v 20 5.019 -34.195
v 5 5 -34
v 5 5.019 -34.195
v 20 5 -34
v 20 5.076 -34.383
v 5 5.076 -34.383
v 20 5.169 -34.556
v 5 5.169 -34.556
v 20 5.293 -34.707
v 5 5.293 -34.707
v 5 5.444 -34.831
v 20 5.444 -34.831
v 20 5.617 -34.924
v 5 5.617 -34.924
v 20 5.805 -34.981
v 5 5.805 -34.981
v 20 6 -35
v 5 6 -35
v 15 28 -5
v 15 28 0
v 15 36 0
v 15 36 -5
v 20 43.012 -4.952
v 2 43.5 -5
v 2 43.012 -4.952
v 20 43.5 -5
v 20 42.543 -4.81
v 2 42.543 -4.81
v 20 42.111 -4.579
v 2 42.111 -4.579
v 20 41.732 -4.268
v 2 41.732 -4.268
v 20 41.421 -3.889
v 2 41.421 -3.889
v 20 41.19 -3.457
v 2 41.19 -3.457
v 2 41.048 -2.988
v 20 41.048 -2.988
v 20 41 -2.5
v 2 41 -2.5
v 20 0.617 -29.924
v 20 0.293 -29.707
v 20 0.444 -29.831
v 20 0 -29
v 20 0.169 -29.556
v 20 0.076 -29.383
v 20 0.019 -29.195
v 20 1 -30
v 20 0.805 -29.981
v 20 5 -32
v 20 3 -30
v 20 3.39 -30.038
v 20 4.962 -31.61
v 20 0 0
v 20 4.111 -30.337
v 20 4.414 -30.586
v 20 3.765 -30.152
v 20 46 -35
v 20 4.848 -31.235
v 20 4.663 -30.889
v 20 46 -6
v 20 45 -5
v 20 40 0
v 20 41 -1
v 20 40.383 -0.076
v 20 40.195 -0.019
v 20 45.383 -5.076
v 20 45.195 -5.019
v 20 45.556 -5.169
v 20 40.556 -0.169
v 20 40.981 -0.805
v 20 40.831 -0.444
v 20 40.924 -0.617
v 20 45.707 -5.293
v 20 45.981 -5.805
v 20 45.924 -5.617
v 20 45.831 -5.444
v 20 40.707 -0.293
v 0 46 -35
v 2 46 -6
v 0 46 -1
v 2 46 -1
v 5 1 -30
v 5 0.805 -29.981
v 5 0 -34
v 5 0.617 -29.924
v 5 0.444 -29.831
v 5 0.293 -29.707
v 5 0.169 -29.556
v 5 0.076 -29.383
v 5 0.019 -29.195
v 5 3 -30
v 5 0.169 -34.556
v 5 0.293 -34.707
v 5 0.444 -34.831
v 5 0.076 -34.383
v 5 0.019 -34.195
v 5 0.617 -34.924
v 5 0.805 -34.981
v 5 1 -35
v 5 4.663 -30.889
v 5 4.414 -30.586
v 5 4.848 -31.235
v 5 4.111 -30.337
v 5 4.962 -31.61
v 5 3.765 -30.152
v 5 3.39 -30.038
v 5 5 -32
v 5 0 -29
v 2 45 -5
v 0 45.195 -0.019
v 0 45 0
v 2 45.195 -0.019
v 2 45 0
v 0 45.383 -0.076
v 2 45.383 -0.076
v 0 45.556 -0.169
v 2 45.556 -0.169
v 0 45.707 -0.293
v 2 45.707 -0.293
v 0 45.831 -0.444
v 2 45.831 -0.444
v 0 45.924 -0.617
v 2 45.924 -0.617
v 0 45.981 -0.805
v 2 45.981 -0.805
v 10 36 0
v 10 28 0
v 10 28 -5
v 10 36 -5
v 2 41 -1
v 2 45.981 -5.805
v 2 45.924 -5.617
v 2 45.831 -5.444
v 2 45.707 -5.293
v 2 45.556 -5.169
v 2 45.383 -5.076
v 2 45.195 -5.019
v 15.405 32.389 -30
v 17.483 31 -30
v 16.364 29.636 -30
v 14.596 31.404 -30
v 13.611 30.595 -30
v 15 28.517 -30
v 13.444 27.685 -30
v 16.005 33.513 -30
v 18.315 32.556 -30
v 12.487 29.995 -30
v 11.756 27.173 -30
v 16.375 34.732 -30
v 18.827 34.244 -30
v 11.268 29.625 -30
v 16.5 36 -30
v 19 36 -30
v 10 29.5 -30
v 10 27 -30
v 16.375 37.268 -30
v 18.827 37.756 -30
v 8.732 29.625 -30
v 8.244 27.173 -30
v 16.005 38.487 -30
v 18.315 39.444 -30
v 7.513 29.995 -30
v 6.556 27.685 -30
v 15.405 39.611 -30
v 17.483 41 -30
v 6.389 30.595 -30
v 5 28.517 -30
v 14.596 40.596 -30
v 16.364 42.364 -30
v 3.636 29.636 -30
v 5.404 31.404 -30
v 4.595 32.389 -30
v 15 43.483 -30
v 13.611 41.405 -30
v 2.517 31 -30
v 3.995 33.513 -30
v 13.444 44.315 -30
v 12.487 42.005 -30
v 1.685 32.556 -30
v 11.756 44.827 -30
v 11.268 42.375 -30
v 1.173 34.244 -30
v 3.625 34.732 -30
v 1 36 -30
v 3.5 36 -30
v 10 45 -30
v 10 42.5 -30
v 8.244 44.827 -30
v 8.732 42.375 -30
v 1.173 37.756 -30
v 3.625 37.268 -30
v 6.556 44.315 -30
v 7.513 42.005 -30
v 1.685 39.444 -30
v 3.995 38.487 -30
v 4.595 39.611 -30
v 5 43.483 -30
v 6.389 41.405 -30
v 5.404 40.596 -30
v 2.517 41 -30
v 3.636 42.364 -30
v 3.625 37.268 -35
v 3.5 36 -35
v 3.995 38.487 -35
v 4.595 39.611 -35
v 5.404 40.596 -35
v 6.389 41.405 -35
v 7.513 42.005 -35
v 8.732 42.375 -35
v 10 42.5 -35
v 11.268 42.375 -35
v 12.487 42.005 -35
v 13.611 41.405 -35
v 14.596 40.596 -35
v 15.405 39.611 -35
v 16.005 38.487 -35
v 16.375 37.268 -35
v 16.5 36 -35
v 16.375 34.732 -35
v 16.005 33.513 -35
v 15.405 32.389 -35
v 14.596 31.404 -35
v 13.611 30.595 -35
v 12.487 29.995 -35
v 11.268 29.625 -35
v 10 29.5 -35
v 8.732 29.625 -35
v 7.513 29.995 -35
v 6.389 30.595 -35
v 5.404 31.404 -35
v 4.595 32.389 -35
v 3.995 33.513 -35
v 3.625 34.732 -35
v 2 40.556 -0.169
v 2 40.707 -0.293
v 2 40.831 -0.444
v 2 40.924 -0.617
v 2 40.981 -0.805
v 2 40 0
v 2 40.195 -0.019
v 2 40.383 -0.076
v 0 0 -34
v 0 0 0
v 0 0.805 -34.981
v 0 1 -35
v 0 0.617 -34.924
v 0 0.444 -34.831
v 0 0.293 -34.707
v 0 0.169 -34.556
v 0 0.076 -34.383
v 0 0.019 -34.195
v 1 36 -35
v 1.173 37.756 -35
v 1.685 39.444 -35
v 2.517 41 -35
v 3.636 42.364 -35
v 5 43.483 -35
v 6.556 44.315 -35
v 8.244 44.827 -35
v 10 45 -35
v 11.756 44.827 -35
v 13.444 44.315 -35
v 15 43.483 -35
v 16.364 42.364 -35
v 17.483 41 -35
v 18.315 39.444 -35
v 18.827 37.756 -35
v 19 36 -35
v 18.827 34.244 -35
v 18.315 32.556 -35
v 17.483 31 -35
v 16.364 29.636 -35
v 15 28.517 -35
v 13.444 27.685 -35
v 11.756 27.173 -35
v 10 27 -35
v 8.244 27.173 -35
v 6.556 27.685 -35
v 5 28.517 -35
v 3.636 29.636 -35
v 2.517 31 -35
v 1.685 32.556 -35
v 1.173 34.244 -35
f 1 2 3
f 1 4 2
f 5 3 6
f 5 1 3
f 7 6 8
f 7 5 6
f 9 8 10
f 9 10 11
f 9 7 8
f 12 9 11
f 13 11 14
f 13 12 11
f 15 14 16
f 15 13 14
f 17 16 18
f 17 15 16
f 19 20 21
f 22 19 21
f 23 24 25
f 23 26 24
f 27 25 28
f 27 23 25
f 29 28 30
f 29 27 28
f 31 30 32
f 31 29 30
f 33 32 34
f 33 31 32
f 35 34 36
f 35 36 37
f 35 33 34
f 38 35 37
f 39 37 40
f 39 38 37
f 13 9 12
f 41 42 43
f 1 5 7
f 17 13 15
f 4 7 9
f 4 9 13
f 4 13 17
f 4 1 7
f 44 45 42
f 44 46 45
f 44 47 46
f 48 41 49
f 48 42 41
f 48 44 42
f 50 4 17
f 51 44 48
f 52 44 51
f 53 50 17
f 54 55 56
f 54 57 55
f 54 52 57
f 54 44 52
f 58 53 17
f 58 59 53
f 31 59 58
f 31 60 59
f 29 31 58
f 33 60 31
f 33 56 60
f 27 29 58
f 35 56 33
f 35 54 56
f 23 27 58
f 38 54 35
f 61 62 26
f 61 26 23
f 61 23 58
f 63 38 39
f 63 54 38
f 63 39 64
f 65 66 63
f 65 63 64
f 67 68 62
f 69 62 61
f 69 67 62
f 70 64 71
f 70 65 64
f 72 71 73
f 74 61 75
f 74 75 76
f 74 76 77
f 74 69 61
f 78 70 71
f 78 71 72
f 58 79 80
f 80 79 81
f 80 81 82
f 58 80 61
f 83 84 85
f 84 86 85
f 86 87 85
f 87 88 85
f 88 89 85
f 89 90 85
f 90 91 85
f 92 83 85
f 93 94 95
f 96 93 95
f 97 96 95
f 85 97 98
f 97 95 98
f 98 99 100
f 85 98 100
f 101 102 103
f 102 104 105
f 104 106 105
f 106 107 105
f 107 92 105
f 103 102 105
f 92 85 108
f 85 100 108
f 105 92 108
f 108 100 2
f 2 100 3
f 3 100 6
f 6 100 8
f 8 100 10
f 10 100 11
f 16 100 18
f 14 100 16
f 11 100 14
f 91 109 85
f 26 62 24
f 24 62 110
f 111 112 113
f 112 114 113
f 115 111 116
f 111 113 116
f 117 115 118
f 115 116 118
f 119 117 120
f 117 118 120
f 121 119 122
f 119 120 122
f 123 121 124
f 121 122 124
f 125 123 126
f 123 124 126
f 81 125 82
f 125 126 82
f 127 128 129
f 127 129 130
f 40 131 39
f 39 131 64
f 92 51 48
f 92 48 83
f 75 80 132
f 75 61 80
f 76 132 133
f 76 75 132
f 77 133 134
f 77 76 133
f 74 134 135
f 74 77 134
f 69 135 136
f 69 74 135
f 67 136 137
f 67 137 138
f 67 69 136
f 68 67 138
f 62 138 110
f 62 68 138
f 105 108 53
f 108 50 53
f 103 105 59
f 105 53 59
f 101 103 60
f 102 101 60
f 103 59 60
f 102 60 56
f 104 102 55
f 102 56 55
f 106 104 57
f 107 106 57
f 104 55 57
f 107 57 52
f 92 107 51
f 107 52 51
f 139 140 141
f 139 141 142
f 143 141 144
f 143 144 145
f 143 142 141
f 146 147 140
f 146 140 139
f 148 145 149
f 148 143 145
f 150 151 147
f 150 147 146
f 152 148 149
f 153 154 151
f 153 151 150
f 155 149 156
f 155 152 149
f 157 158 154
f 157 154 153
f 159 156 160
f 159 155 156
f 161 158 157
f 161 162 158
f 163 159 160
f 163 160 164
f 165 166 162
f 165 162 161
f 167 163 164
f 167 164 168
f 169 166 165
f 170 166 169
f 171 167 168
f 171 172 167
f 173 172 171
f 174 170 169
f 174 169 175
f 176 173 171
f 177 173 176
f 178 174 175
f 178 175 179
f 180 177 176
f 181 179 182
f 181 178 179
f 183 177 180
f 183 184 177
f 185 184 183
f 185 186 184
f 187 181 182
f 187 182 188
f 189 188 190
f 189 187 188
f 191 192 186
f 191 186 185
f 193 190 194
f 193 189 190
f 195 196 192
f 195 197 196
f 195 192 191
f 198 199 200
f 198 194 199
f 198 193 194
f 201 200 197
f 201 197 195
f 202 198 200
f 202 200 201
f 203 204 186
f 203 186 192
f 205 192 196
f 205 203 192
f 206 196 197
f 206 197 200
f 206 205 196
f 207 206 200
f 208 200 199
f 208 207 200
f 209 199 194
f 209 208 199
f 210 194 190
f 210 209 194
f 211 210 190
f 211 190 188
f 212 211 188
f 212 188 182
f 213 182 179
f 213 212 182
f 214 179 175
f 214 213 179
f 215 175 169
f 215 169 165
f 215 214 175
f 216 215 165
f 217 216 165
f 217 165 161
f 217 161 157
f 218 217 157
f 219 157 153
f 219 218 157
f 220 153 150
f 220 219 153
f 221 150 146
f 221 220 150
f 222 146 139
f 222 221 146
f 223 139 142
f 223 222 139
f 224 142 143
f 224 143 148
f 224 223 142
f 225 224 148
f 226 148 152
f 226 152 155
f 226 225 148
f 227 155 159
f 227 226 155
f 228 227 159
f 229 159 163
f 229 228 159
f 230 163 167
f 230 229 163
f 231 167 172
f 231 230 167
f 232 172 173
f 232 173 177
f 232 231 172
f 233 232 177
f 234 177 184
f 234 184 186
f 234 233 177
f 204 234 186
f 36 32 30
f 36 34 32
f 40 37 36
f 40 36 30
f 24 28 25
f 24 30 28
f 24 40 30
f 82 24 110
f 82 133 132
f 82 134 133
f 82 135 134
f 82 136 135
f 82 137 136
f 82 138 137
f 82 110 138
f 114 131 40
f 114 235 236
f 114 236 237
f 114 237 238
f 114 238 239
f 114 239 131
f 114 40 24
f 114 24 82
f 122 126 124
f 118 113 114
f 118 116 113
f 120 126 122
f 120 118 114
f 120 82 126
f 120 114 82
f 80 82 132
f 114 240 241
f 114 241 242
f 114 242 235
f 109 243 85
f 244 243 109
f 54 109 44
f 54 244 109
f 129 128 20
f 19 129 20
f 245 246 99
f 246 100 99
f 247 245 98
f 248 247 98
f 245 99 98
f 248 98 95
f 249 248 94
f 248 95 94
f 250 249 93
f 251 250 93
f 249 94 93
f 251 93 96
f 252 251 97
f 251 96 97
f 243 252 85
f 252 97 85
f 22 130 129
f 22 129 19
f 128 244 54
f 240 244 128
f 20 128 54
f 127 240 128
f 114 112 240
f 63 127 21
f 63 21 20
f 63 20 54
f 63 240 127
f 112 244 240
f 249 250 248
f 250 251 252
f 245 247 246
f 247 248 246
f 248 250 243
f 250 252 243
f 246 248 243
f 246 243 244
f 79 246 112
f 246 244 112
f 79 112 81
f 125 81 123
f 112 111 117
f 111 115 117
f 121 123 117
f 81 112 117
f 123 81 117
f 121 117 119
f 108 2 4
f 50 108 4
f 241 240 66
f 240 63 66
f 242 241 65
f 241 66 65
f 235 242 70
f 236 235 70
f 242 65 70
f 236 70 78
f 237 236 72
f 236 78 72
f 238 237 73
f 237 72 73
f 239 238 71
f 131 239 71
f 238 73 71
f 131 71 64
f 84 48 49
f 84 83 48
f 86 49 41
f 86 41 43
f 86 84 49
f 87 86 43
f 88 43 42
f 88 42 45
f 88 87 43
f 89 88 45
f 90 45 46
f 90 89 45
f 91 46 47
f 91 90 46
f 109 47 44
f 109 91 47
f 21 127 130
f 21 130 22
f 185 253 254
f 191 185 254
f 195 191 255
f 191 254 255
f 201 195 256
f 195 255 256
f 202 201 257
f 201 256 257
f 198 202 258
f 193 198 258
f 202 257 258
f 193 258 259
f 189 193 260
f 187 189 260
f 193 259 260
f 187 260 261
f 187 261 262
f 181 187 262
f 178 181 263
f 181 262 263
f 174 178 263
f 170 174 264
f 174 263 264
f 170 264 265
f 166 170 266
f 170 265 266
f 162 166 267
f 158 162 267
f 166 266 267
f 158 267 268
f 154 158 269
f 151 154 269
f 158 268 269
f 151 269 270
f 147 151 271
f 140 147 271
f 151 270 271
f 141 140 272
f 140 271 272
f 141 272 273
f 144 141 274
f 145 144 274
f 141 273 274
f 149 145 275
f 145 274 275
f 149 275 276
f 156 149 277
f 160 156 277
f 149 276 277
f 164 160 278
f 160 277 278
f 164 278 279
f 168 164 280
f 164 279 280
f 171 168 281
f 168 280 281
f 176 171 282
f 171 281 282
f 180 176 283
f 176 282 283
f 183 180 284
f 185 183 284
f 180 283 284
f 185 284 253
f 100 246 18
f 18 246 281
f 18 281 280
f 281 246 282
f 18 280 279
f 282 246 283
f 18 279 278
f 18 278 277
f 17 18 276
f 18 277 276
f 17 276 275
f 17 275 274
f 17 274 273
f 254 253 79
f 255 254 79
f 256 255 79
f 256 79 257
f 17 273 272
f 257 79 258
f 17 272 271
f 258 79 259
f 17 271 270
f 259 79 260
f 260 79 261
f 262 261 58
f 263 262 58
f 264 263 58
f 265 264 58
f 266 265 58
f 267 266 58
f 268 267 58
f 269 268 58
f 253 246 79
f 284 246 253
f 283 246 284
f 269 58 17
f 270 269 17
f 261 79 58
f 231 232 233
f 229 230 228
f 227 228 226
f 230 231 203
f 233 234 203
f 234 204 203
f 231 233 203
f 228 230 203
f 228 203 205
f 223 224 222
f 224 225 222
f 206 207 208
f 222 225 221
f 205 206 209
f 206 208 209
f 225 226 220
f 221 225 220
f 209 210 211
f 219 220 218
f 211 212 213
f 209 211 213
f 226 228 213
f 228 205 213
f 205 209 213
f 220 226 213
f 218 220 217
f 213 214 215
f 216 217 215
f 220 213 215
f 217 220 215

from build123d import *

# Parameters (mm, degrees)
SKETCH1_W           = 20
SKETCH1_H           = 46
BOSS_EXTRUDE1_DEPTH = 35
SKETCH2_W           = 5
SKETCH2_H           = 8
CUT_EXTRUDE1_DEPTH  = 5
FILLET1_R           = 2.5
FILLET2_R           = 1
FILLET3_R           = 1
SKETCH3_R           = 9
SKETCH3_R_2         = 6.5
CUT_EXTRUDE2_DEPTH  = 5
FILLET4_R           = 2
FILLET5_R           = 1


with BuildPart() as part:
    # Sketch1 → Boss-Extrude1 (new body)
    with BuildSketch(Plane.XY):
        with Locations((10, 23)):
            Rectangle(SKETCH1_W, SKETCH1_H)
    extrude(amount=-BOSS_EXTRUDE1_DEPTH)

    # Sketch2 → Cut-Extrude1 (cut)
    with BuildSketch(Plane.XY):
        Polygon((10, 41), (2, 41), (2, 46), (20, 46), (20, 41), align=None)
        with Locations((12.5, 32)):
            Rectangle(SKETCH2_W, SKETCH2_H)
    extrude(amount=-CUT_EXTRUDE1_DEPTH, mode=Mode.SUBTRACT)

    # Fillet1
    fillet1_edges = [part.edges().sort_by_distance(p)[0] for p in [
        (11, 41, -5),
    ]]
    fillet(fillet1_edges, radius=FILLET1_R)

    # Fillet2
    fillet2_edges = [part.edges().sort_by_distance(p)[0] for p in [
        (1, 46, 0),
    ]]
    fillet(fillet2_edges, radius=FILLET2_R)

    # Fillet3
    fillet3_edges = [part.edges().sort_by_distance(p)[0] for p in [
        (11, 46, -5),
        (11, 41, 0),
    ]]
    fillet(fillet3_edges, radius=FILLET3_R)

    # Sketch3 → Cut-Extrude2 (cut)
    with BuildSketch(Plane(origin=(0, 0, -35), x_dir=(-1, 0, 0), z_dir=(0, 0, -1))):
        with Locations((-10, 36)):
            Circle(SKETCH3_R)
        with Locations((-10, 36)):
            Circle(SKETCH3_R_2, mode=Mode.SUBTRACT)
        Polygon((-10, 5), (-20, 5), (-20, 0), (-5, 0), (-5, 5), align=None)
    extrude(amount=-CUT_EXTRUDE2_DEPTH, mode=Mode.SUBTRACT)

    # Fillet4
    fillet4_edges = [part.edges().sort_by_distance(p)[0] for p in [
        (12.5, 5, -30),
    ]]
    fillet(fillet4_edges, radius=FILLET4_R)

    # Fillet5
    fillet5_edges = [part.edges().sort_by_distance(p)[0] for p in [
        (12.5, 0, -30),
        (12.5, 5, -35),
        (2.5, 0, -35),
    ]]
    fillet(fillet5_edges, radius=FILLET5_R)


solid = part.part
